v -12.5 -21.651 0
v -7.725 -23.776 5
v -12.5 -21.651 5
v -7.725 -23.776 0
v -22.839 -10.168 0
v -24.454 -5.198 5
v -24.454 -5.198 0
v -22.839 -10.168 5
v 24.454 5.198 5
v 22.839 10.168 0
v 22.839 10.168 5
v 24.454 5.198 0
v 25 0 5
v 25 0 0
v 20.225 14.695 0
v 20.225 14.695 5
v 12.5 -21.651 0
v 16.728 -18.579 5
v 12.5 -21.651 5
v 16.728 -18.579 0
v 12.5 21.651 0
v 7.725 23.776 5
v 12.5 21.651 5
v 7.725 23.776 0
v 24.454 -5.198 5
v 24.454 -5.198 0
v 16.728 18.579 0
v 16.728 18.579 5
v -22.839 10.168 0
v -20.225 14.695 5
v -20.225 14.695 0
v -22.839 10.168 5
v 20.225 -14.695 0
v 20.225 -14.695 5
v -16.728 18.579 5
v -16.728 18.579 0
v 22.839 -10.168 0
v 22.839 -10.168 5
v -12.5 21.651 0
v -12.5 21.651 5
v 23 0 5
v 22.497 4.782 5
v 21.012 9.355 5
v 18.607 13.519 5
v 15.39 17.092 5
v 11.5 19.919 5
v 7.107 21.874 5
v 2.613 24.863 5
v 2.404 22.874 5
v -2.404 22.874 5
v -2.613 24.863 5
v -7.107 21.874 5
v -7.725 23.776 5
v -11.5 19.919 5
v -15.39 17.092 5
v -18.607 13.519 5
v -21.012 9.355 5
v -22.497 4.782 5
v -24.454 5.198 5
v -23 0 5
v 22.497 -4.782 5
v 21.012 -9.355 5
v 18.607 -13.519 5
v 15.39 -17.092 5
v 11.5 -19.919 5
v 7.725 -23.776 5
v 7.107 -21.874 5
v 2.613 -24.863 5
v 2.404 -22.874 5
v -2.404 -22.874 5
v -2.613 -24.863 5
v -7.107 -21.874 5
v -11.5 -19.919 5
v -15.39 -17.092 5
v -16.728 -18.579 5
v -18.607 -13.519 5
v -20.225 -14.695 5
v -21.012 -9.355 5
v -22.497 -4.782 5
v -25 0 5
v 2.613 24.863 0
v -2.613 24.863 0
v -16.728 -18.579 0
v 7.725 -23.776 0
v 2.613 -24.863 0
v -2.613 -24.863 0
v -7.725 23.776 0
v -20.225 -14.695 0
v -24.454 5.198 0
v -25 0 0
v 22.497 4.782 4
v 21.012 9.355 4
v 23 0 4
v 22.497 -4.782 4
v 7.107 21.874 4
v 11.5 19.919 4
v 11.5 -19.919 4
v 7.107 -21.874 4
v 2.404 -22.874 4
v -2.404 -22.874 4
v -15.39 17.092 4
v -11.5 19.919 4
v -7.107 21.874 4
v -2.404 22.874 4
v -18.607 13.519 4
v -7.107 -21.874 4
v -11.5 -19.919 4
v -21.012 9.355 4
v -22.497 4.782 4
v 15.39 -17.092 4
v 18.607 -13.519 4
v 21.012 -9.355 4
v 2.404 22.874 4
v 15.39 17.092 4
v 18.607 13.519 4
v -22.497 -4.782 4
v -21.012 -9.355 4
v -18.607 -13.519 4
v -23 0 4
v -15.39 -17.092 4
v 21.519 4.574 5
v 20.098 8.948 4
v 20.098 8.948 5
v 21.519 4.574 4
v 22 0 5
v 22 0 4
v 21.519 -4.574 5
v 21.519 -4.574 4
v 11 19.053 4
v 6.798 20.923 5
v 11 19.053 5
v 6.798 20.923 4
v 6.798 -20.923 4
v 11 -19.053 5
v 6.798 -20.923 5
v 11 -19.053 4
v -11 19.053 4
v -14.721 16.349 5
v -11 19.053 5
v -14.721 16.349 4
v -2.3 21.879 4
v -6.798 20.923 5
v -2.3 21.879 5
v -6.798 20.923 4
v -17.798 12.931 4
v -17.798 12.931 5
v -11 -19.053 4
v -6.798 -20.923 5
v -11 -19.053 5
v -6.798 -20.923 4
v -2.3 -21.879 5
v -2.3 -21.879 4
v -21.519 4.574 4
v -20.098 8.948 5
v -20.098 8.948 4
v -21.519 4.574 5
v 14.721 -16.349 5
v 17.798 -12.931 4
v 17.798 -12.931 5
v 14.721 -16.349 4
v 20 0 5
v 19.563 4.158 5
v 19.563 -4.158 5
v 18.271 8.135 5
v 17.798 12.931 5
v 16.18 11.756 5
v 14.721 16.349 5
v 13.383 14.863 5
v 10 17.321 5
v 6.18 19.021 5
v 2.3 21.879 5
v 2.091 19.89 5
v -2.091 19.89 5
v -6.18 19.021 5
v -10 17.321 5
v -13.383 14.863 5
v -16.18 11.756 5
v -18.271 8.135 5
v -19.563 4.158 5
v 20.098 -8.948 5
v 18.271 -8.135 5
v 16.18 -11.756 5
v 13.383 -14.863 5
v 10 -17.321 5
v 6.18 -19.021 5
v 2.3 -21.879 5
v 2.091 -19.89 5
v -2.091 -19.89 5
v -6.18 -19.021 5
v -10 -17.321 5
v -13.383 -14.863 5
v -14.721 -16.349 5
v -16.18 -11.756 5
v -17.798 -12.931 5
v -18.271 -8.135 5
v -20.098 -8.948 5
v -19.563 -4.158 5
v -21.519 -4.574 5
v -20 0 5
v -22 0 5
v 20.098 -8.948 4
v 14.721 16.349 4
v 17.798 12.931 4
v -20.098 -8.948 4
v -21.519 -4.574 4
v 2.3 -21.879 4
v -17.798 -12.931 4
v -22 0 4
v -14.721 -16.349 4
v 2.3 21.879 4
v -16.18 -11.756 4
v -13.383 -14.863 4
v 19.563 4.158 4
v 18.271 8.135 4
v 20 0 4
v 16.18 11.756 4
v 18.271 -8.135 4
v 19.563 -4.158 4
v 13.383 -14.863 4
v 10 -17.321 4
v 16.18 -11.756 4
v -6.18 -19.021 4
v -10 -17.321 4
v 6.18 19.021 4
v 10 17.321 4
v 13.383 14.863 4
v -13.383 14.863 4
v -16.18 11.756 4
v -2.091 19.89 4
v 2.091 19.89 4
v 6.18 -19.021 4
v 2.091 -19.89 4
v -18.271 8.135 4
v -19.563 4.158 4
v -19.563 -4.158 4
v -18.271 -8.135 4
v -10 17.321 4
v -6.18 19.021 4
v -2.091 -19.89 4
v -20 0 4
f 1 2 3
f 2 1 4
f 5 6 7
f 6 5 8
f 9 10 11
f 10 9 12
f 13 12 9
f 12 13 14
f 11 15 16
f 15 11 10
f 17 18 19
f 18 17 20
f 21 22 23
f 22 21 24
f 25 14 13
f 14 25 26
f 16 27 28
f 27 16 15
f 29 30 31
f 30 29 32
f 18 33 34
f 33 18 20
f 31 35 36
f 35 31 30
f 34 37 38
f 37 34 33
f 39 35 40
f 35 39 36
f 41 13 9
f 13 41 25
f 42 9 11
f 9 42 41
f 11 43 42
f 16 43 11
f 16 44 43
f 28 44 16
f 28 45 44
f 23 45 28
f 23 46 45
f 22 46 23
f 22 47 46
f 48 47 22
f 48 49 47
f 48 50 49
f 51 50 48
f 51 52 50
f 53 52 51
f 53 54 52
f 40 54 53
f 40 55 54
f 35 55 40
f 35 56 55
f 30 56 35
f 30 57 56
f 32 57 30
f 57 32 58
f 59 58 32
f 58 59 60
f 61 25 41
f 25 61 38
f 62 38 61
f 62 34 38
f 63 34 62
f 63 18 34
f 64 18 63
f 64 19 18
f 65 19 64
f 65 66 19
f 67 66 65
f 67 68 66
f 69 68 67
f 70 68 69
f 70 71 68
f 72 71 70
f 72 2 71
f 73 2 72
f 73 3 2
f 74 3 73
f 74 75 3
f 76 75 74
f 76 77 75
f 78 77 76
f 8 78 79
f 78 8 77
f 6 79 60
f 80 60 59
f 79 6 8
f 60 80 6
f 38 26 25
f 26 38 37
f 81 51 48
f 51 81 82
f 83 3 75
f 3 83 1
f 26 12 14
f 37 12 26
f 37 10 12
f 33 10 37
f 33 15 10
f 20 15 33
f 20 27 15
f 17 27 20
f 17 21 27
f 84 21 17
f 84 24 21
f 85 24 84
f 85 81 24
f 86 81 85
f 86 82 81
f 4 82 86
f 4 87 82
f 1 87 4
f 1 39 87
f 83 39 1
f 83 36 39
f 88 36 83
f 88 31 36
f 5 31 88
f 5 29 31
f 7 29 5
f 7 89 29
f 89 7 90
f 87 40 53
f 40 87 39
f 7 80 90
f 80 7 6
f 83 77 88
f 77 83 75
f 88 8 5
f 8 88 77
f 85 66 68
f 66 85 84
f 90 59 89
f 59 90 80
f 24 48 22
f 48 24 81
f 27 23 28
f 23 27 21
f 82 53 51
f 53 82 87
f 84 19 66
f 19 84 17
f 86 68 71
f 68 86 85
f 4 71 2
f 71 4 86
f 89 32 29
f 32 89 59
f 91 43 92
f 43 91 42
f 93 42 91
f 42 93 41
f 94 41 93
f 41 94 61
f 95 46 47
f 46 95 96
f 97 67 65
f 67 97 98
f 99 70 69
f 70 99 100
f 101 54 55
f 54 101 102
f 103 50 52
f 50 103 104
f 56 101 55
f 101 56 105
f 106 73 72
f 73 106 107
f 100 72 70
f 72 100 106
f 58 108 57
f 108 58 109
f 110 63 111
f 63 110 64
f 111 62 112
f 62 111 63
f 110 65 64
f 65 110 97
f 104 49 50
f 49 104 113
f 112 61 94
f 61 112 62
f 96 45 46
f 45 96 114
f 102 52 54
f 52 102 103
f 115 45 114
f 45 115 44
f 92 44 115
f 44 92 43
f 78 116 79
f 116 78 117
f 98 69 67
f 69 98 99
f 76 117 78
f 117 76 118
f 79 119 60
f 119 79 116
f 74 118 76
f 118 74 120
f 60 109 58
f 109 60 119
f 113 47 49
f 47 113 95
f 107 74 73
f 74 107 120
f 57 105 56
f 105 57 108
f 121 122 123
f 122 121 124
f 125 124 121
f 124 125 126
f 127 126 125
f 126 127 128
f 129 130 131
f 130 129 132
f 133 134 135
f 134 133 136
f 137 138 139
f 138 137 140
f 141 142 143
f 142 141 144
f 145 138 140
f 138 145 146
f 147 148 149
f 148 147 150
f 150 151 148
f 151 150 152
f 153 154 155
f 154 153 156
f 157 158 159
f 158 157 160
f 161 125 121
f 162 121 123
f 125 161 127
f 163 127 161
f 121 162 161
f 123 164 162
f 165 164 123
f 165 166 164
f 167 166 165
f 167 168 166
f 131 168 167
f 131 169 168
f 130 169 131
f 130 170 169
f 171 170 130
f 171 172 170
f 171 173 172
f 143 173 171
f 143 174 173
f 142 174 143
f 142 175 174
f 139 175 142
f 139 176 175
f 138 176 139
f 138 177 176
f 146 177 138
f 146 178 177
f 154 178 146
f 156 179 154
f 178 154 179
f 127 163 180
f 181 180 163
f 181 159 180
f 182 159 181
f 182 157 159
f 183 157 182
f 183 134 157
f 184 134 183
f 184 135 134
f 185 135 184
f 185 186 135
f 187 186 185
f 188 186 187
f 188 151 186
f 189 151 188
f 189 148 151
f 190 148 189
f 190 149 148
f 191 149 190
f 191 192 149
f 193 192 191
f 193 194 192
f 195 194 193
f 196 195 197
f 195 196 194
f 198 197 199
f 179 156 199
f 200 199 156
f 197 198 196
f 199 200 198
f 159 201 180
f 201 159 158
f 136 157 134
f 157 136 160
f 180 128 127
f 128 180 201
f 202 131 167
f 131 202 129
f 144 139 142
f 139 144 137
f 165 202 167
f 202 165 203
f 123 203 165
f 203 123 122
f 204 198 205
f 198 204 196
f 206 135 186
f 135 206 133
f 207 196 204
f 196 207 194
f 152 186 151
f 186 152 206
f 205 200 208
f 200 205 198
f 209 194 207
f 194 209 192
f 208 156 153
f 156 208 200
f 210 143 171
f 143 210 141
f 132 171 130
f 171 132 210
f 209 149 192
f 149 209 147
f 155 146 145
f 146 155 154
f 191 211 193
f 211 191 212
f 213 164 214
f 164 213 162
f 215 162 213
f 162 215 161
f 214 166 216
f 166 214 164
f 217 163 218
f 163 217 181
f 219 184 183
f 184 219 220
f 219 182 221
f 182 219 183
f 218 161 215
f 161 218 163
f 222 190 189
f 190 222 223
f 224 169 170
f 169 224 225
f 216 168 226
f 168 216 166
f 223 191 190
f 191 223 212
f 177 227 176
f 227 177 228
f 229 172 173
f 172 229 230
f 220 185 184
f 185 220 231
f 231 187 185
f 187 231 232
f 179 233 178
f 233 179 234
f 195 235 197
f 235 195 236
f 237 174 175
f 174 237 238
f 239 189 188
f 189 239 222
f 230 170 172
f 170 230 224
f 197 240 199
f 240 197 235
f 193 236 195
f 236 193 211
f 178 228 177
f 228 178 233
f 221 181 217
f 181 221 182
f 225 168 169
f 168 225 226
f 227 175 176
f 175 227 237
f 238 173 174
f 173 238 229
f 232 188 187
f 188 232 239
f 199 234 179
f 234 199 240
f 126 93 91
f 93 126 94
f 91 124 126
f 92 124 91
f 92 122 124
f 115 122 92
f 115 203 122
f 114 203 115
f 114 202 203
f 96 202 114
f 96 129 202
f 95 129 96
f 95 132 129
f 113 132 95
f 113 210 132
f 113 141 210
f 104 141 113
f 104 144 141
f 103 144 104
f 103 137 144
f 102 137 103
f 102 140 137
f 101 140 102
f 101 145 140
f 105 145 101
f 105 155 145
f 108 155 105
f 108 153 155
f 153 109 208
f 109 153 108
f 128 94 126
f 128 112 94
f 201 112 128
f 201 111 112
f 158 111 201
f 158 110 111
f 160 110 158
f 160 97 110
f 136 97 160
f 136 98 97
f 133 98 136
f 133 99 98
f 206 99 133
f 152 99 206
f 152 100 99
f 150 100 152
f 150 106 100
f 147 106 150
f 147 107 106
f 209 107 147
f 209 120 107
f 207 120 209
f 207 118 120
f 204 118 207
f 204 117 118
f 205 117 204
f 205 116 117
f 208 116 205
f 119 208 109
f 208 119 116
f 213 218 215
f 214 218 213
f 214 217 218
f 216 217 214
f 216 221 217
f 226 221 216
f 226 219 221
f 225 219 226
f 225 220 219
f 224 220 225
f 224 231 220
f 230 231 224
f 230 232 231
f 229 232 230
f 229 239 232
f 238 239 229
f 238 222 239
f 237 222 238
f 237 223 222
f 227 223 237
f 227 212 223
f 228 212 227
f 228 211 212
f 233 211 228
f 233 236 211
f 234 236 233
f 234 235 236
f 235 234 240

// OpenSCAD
union(){
    
difference(){
    cylinder(h=5, r1=25, r2=25, center=false);    
    cylinder(h=5, r1=23, r2=23, center=false);    
}
cylinder(h=4, r1=23, r2=23, center=false);
difference(){
    cylinder(h=5, r1=22, r2=22, center=false);    
    cylinder(h=5, r1=20, r2=20, center=false);    
}
cylinder(h=1, r1=25, r2=25, center=false);
}
